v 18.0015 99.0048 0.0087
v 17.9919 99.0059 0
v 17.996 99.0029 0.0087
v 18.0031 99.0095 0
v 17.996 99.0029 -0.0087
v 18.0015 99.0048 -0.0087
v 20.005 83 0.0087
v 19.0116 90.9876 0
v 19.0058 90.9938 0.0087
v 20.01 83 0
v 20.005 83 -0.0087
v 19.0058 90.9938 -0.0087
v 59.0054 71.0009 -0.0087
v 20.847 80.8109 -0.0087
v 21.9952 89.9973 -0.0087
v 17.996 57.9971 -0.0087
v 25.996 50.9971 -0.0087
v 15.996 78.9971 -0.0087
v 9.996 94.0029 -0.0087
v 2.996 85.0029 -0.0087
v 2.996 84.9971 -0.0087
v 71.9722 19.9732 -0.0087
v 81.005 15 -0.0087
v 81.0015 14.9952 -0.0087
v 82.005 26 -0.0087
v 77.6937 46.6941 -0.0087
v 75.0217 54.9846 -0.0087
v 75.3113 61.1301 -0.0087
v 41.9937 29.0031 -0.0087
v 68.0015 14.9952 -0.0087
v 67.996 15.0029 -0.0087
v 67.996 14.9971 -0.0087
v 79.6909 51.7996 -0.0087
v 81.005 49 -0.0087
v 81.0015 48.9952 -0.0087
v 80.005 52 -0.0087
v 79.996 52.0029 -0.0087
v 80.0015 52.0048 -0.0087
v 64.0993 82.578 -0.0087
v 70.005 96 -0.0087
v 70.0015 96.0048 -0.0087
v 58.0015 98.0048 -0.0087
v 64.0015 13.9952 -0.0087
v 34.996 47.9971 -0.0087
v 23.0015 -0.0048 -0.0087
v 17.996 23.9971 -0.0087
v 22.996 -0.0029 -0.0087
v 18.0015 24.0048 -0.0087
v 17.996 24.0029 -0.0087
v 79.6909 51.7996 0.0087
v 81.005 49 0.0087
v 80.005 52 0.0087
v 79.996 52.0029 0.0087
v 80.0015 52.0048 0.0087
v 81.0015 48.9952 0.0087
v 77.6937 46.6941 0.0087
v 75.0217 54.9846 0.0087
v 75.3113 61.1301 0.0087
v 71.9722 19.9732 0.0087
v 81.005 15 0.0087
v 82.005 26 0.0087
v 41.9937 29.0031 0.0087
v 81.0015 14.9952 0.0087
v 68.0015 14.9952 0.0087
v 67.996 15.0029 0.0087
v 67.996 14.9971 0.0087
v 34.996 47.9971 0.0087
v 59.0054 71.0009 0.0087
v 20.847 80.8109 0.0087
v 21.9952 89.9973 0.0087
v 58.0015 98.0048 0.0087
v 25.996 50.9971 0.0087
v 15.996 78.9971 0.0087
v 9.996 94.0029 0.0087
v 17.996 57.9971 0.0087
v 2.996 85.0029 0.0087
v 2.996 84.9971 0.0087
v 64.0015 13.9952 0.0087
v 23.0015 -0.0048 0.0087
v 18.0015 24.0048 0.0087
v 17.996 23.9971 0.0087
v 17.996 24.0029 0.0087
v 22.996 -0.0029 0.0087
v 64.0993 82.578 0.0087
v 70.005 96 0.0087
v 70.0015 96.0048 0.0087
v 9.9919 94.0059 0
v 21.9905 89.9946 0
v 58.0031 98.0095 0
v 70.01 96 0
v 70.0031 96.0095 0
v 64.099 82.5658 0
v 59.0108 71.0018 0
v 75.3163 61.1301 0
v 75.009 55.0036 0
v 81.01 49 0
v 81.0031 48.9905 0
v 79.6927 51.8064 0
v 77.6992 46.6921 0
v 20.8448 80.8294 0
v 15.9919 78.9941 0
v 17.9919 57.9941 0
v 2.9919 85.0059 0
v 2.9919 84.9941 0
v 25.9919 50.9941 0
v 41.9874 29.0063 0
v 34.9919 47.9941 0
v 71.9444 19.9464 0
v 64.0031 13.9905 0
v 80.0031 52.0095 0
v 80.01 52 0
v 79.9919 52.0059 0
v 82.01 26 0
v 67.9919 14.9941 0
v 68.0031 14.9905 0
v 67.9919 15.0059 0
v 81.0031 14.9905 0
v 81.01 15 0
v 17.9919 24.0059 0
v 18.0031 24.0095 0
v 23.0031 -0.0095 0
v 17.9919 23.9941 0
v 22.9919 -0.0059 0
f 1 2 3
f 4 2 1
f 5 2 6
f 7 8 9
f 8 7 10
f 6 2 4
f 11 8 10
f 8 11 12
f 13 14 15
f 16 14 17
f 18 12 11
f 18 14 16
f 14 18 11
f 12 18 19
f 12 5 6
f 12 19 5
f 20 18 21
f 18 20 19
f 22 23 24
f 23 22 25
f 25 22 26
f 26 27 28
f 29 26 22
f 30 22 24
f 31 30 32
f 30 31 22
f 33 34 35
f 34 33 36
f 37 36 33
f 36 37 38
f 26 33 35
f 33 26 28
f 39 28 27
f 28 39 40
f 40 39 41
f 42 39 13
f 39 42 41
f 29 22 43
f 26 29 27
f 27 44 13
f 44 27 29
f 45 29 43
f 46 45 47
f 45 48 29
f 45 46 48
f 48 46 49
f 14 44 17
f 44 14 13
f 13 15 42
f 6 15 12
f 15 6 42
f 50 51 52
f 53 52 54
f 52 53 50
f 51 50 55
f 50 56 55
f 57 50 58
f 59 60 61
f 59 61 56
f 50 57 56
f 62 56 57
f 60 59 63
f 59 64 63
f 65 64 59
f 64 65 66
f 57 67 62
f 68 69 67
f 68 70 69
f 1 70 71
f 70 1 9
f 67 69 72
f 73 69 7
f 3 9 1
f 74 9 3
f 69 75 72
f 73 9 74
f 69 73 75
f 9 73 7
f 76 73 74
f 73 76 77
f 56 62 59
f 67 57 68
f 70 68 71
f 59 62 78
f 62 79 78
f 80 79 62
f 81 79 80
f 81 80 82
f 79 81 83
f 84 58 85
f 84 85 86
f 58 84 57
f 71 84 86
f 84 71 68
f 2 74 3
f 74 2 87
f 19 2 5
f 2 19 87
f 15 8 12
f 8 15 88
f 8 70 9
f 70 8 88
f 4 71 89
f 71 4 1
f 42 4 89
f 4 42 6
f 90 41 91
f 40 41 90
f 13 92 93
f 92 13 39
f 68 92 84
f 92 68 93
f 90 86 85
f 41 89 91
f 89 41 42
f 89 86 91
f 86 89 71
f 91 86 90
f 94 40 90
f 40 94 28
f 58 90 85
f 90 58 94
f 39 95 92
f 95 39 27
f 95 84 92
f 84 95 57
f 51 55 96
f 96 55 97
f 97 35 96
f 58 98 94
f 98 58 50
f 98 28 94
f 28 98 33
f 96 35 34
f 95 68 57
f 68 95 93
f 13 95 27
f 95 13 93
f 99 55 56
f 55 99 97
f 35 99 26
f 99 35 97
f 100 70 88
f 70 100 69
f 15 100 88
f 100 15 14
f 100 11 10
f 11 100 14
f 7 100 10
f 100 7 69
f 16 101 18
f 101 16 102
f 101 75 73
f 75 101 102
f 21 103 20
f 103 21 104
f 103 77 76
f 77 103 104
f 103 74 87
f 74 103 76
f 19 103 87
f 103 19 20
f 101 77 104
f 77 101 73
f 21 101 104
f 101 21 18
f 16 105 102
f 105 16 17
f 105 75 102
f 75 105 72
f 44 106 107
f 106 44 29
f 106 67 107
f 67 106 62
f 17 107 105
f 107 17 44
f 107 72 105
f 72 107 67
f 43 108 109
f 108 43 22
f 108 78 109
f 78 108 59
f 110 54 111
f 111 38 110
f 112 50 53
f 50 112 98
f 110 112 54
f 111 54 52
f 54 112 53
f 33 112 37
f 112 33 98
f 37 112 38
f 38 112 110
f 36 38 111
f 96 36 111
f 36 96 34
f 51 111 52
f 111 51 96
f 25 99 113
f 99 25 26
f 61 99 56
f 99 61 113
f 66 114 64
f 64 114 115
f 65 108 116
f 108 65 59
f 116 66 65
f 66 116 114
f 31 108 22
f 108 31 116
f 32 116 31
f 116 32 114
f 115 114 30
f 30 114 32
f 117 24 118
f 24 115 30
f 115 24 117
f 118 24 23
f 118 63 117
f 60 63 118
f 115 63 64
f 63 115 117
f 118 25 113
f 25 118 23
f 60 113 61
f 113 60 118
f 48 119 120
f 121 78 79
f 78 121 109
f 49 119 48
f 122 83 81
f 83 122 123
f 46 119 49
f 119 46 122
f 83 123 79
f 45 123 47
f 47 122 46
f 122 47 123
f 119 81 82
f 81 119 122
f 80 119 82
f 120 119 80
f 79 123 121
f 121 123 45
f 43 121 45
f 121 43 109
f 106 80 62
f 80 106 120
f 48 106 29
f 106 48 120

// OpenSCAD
color([0.5839405385485582,0.4048698908705002,0.6877557316706271]) hull(){
    translate([18,99]) sphere(0.01);
    translate([20,83]) sphere(0.01);
    translate([16,79]) sphere(0.01);
}
color([0.29310936231965135,0.08456113000314536,0.6409271470126323]) hull(){
    translate([18,99]) sphere(0.01);
    translate([10,94]) sphere(0.01);
    translate([16,79]) sphere(0.01);
}
color([0.38512246522478266,0.6162859510128613,0.407224705538046]) hull(){
    translate([18,99]) sphere(0.01);
    translate([22,90]) sphere(0.01);
    translate([10,94]) sphere(0.01);
}
color([0.6107800780239486,0.9541913078580654,0.09369719926319908]) hull(){
    translate([18,99]) sphere(0.01);
    translate([22,90]) sphere(0.01);
    translate([39,98]) sphere(0.01);
}
color([0.4396226851829427,0.9817497074141792,0.30111933510979894]) hull(){
    translate([18,99]) sphere(0.01);
    translate([39,98]) sphere(0.01);
    translate([58,98]) sphere(0.01);
}
color([0.08571041628526821,0.691130580335744,0.16573157374072334]) hull(){
    translate([39,98]) sphere(0.01);
    translate([50,93]) sphere(0.01);
    translate([58,98]) sphere(0.01);
}
color([0.4668304924867862,0.30100213617539295,0.3511677492745029]) hull(){
    translate([39,98]) sphere(0.01);
    translate([22,90]) sphere(0.01);
    translate([50,93]) sphere(0.01);
}
color([0.05564944269037686,0.7696481469448815,0.686275624239137]) hull(){
    translate([50,93]) sphere(0.01);
    translate([59,71]) sphere(0.01);
    translate([58,98]) sphere(0.01);
}
color([0.15447252119296884,0.35335085758162643,0.18799175914388588]) hull(){
    translate([50,93]) sphere(0.01);
    translate([59,71]) sphere(0.01);
    translate([22,90]) sphere(0.01);
}
color([0.41322879780265653,0.82270842281296,0.9057146612667819]) hull(){
    translate([58,98]) sphere(0.01);
    translate([70,96]) sphere(0.01);
    translate([59,71]) sphere(0.01);
}
color([0.9688547633127277,0.5528378273263655,0.12760284187612392]) hull(){
    translate([58,98]) sphere(0.01);
    translate([70,96]) sphere(0.01);
    translate([77,50]) sphere(0.01);
}
color([0.1710979555253146,0.7131998843266452,0.6397779425125977]) hull(){
    translate([58,98]) sphere(0.01);
    translate([77,50]) sphere(0.01);
    translate([81,49]) sphere(0.01);
}
color([0.57496968906483,0.8489371230716904,0.07944838941339594]) hull(){
    translate([59,71]) sphere(0.01);
    translate([81,49]) sphere(0.01);
    translate([77,50]) sphere(0.01);
}
color([0.040333123224873146,0.9305910632054132,0.3080440975445232]) hull(){
    translate([59,71]) sphere(0.01);
    translate([81,49]) sphere(0.01);
    translate([58,33]) sphere(0.01);
}
color([0.6084655882345898,0.4923441190446234,0.7069385087242315]) hull(){
    translate([59,71]) sphere(0.01);
    translate([44,55]) sphere(0.01);
    translate([58,33]) sphere(0.01);
}
color([0.6803385961846494,0.18024793645131376,0.10787678186317007]) hull(){
    translate([59,71]) sphere(0.01);
    translate([44,55]) sphere(0.01);
    translate([35,48]) sphere(0.01);
}
color([0.1335624130282893,0.47731112778056706,0.8393950916733898]) hull(){
    translate([59,71]) sphere(0.01);
    translate([35,48]) sphere(0.01);
    translate([30,57]) sphere(0.01);
}
color([0.6780893207968227,0.08337096158279222,0.27725115680544954]) hull(){
    translate([59,71]) sphere(0.01);
    translate([30,57]) sphere(0.01);
    translate([18,58]) sphere(0.01);
}
color([0.9965791662073833,0.03375154870506614,0.10494976972159242]) hull(){
    translate([59,71]) sphere(0.01);
    translate([18,58]) sphere(0.01);
    translate([22,90]) sphere(0.01);
}
color([0.516844917539197,0.1360610465034362,0.543805910213663]) hull(){
    translate([30,57]) sphere(0.01);
    translate([20,83]) sphere(0.01);
    translate([18,58]) sphere(0.01);
}
color([0.04901628196141694,0.4867102513994055,0.8813892002857401]) hull(){
    translate([30,57]) sphere(0.01);
    translate([20,83]) sphere(0.01);
    translate([16,79]) sphere(0.01);
}
color([0.3053751014353143,0.40772022041766365,0.31297204198076634]) hull(){
    translate([18,58]) sphere(0.01);
    translate([16,79]) sphere(0.01);
    translate([20,83]) sphere(0.01);
}
color([0.49907796034366436,0.6160709555012981,0.9916538905911245]) hull(){
    translate([10,94]) sphere(0.01);
    translate([16,79]) sphere(0.01);
    translate([6,84]) sphere(0.01);
}
color([0.3123575451593331,0.46364206475662195,0.8862899719975306]) hull(){
    translate([10,94]) sphere(0.01);
    translate([6,84]) sphere(0.01);
    translate([3,85]) sphere(0.01);
}
color([0.5738800220993816,0.8494037217359881,0.24323676398212035]) hull(){
    translate([20,83]) sphere(0.01);
    translate([6,84]) sphere(0.01);
    translate([3,85]) sphere(0.01);
}
color([0.8402878098664139,0.9530478541805099,0.16594803365564914]) hull(){
    translate([20,83]) sphere(0.01);
    translate([3,85]) sphere(0.01);
    translate([16,79]) sphere(0.01);
}
color([0.0023370868964924796,0.7387895340607371,0.5374530602666081]) hull(){
    translate([18,58]) sphere(0.01);
    translate([44,55]) sphere(0.01);
    translate([44,47]) sphere(0.01);
}
color([0.25604025835089217,0.4320068924153808,0.5112453323210508]) hull(){
    translate([18,58]) sphere(0.01);
    translate([44,55]) sphere(0.01);
    translate([26,51]) sphere(0.01);
}
color([0.7462272619347637,0.5039790716190428,0.8850839351693509]) hull(){
    translate([18,58]) sphere(0.01);
    translate([26,51]) sphere(0.01);
    translate([30,57]) sphere(0.01);
}
color([0.6652757233710683,0.22263754843686523,0.08942086350367451]) hull(){
    translate([44,55]) sphere(0.01);
    translate([42,29]) sphere(0.01);
    translate([35,48]) sphere(0.01);
}
color([0.6195232841458308,0.9036720387350747,0.7222923954673625]) hull(){
    translate([44,55]) sphere(0.01);
    translate([42,29]) sphere(0.01);
    translate([44,47]) sphere(0.01);
}
color([0.6665075097113882,0.5421139713900744,0.6943978877819516]) hull(){
    translate([44,55]) sphere(0.01);
    translate([58,33]) sphere(0.01);
    translate([42,29]) sphere(0.01);
}
color([0.9269770591996176,0.12480324665016229,0.8422397758241813]) hull(){
    translate([44,55]) sphere(0.01);
    translate([58,33]) sphere(0.01);
    translate([44,47]) sphere(0.01);
}
color([0.028249143050612435,0.8554899328562455,0.6212809598996976]) hull(){
    translate([35,48]) sphere(0.01);
    translate([26,51]) sphere(0.01);
    translate([30,57]) sphere(0.01);
}
color([0.6435486749275994,0.4857227915978113,0.2898251547629681]) hull(){
    translate([35,48]) sphere(0.01);
    translate([44,55]) sphere(0.01);
    translate([26,51]) sphere(0.01);
}
color([0.21709076393122206,0.4979948584580751,0.6176241526046676]) hull(){
    translate([42,29]) sphere(0.01);
    translate([58,33]) sphere(0.01);
    translate([72,20]) sphere(0.01);
}
color([0.4722249532281336,0.7228331534363125,0.6109414561657331]) hull(){
    translate([42,29]) sphere(0.01);
    translate([72,20]) sphere(0.01);
    translate([64,14]) sphere(0.01);
}
color([0.5330085163671737,0.6769359871291822,0.5973748769978083]) hull(){
    translate([42,29]) sphere(0.01);
    translate([64,14]) sphere(0.01);
    translate([58,33]) sphere(0.01);
}
color([0.14460255854654236,0.21273280877313017,0.8417179364881341]) hull(){
    translate([58,33]) sphere(0.01);
    translate([77,50]) sphere(0.01);
    translate([72,20]) sphere(0.01);
}
color([0.6300391880279899,0.5103677782275869,0.4479627161837708]) hull(){
    translate([58,33]) sphere(0.01);
    translate([80,52]) sphere(0.01);
    translate([77,50]) sphere(0.01);
}
color([0.2903518628620462,0.1744676713524972,0.5457372127765215]) hull(){
    translate([58,33]) sphere(0.01);
    translate([80,52]) sphere(0.01);
    translate([81,49]) sphere(0.01);
}
color([0.6340658375422632,0.7004271366493812,0.690956934786038]) hull(){
    translate([72,20]) sphere(0.01);
    translate([77,50]) sphere(0.01);
    translate([82,26]) sphere(0.01);
}
color([0.013948469234104865,0.8018456354370093,0.2607079205191076]) hull(){
    translate([72,20]) sphere(0.01);
    translate([82,26]) sphere(0.01);
    translate([68,15]) sphere(0.01);
}
color([0.01899716010339858,0.7507132946374245,0.44168653561511173]) hull(){
    translate([72,20]) sphere(0.01);
    translate([68,15]) sphere(0.01);
    translate([81,15]) sphere(0.01);
}
color([0.1668653701245908,0.45955837321901094,0.7876756969907556]) hull(){
    translate([72,20]) sphere(0.01);
    translate([81,15]) sphere(0.01);
    translate([82,26]) sphere(0.01);
}
color([0.09564527702692727,0.06733136152719421,0.7816649665975636]) hull(){
    translate([64,14]) sphere(0.01);
    translate([23,0]) sphere(0.01);
    translate([18,24]) sphere(0.01);
}
color([0.030385075649315252,0.33346286891595733,0.08647112242809318]) hull(){
    translate([64,14]) sphere(0.01);
    translate([23,0]) sphere(0.01);
    translate([24,21]) sphere(0.01);
}
color([0.8161439782233904,0.05657658467482607,0.8243668117903717]) hull(){
    translate([64,14]) sphere(0.01);
    translate([24,21]) sphere(0.01);
    translate([26,22]) sphere(0.01);
}
color([0.05808931884644186,0.6181904095369413,0.1426995958976538]) hull(){
    translate([64,14]) sphere(0.01);
    translate([26,22]) sphere(0.01);
    translate([42,29]) sphere(0.01);
}
color([0.3846464495954227,0.3794414211645075,0.7643773332264734]) hull(){
    translate([64,14]) sphere(0.01);
    translate([42,29]) sphere(0.01);
    translate([23,0]) sphere(0.01);
}
color([0.3116889002403487,0.7690158776827113,0.7674729074453902]) hull(){
    translate([18,24]) sphere(0.01);
    translate([26,22]) sphere(0.01);
    translate([24,21]) sphere(0.01);
}
color([0.3394448706328078,0.45855440081433096,0.0007502935671159783]) hull(){
    translate([18,24]) sphere(0.01);
    translate([42,29]) sphere(0.01);
    translate([26,22]) sphere(0.01);
}
color([0.8084995756647368,0.0331322283588068,0.9954935019736515]) hull(){
    translate([18,24]) sphere(0.01);
    translate([23,0]) sphere(0.01);
    translate([26,22]) sphere(0.01);
}
color([0.32750610520168044,0.511786711221762,0.09639677946248049]) hull(){
    translate([18,24]) sphere(0.01);
    translate([23,0]) sphere(0.01);
    translate([24,21]) sphere(0.01);
}
